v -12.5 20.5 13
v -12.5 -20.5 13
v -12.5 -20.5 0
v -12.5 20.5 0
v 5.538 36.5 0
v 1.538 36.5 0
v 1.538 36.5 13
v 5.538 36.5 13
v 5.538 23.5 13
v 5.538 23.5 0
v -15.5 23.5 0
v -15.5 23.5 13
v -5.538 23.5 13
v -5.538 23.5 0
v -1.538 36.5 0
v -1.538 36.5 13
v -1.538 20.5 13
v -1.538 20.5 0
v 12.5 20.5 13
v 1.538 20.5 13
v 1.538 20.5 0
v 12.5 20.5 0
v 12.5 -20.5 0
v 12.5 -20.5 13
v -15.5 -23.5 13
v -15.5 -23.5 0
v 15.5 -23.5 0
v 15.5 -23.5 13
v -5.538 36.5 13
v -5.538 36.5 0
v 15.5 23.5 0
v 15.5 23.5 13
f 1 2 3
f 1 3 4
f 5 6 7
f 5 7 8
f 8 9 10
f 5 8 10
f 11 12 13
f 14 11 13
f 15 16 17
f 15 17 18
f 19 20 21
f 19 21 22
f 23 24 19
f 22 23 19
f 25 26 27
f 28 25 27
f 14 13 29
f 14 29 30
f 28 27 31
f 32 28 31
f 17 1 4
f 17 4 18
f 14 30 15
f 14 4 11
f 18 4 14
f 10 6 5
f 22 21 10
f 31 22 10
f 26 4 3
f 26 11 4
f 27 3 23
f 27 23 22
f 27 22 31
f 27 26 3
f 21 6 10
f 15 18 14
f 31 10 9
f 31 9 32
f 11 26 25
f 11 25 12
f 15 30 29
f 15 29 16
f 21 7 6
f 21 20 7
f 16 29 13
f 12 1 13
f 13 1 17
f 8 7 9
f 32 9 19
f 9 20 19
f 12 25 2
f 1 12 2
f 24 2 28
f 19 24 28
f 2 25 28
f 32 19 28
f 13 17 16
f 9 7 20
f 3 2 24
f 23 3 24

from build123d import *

# Parameters (mm, degrees)
CROQUIS1_W              = 31
CROQUIS1_H              = 47
SALIENTE_EXTRUIR1_DEPTH = 13
CROQUIS2_W              = 25
CROQUIS2_H              = 41
CORTAR_EXTRUIR1_DEPTH   = 13
CROQUIS3_W              = 3.075448652
CROQUIS3_H              = 33.686173061
CORTAR_EXTRUIR2_DEPTH   = 13
CROQUIS4_W              = 4
CROQUIS4_H              = 13
SALIENTE_EXTRUIR2_DEPTH = 13


with BuildPart() as part:
    # Croquis1 → Saliente-Extruir1 (new body)
    with BuildSketch(Plane.XY):
        Rectangle(CROQUIS1_W, CROQUIS1_H)
    extrude(amount=SALIENTE_EXTRUIR1_DEPTH)

    # Croquis2 → Cortar-Extruir1 (cut)
    with BuildSketch(Plane.XY.offset(13)):
        Rectangle(CROQUIS2_W, CROQUIS2_H)
    extrude(amount=-CORTAR_EXTRUIR1_DEPTH, mode=Mode.SUBTRACT)

    # Croquis3 → Cortar-Extruir2 (cut)
    with BuildSketch(Plane(origin=(0, 23.5, 0), x_dir=(1, 0, 0), z_dir=(0, 1, 0))):
        with Locations((0, -5.988894029)):
            Rectangle(CROQUIS3_W, CROQUIS3_H)
    extrude(amount=-CORTAR_EXTRUIR2_DEPTH, mode=Mode.SUBTRACT)

    # Croquis4 → Saliente-Extruir2 (add)
    with BuildSketch(Plane(origin=(0, 23.5, 0), x_dir=(1, 0, 0), z_dir=(0, 1, 0))):
        with Locations((3.537724326, -6.5)):
            Rectangle(CROQUIS4_W, CROQUIS4_H)
        with Locations((-3.537724326, -6.5)):
            Rectangle(CROQUIS4_W, CROQUIS4_H)
    extrude(amount=SALIENTE_EXTRUIR2_DEPTH)


solid = part.part
